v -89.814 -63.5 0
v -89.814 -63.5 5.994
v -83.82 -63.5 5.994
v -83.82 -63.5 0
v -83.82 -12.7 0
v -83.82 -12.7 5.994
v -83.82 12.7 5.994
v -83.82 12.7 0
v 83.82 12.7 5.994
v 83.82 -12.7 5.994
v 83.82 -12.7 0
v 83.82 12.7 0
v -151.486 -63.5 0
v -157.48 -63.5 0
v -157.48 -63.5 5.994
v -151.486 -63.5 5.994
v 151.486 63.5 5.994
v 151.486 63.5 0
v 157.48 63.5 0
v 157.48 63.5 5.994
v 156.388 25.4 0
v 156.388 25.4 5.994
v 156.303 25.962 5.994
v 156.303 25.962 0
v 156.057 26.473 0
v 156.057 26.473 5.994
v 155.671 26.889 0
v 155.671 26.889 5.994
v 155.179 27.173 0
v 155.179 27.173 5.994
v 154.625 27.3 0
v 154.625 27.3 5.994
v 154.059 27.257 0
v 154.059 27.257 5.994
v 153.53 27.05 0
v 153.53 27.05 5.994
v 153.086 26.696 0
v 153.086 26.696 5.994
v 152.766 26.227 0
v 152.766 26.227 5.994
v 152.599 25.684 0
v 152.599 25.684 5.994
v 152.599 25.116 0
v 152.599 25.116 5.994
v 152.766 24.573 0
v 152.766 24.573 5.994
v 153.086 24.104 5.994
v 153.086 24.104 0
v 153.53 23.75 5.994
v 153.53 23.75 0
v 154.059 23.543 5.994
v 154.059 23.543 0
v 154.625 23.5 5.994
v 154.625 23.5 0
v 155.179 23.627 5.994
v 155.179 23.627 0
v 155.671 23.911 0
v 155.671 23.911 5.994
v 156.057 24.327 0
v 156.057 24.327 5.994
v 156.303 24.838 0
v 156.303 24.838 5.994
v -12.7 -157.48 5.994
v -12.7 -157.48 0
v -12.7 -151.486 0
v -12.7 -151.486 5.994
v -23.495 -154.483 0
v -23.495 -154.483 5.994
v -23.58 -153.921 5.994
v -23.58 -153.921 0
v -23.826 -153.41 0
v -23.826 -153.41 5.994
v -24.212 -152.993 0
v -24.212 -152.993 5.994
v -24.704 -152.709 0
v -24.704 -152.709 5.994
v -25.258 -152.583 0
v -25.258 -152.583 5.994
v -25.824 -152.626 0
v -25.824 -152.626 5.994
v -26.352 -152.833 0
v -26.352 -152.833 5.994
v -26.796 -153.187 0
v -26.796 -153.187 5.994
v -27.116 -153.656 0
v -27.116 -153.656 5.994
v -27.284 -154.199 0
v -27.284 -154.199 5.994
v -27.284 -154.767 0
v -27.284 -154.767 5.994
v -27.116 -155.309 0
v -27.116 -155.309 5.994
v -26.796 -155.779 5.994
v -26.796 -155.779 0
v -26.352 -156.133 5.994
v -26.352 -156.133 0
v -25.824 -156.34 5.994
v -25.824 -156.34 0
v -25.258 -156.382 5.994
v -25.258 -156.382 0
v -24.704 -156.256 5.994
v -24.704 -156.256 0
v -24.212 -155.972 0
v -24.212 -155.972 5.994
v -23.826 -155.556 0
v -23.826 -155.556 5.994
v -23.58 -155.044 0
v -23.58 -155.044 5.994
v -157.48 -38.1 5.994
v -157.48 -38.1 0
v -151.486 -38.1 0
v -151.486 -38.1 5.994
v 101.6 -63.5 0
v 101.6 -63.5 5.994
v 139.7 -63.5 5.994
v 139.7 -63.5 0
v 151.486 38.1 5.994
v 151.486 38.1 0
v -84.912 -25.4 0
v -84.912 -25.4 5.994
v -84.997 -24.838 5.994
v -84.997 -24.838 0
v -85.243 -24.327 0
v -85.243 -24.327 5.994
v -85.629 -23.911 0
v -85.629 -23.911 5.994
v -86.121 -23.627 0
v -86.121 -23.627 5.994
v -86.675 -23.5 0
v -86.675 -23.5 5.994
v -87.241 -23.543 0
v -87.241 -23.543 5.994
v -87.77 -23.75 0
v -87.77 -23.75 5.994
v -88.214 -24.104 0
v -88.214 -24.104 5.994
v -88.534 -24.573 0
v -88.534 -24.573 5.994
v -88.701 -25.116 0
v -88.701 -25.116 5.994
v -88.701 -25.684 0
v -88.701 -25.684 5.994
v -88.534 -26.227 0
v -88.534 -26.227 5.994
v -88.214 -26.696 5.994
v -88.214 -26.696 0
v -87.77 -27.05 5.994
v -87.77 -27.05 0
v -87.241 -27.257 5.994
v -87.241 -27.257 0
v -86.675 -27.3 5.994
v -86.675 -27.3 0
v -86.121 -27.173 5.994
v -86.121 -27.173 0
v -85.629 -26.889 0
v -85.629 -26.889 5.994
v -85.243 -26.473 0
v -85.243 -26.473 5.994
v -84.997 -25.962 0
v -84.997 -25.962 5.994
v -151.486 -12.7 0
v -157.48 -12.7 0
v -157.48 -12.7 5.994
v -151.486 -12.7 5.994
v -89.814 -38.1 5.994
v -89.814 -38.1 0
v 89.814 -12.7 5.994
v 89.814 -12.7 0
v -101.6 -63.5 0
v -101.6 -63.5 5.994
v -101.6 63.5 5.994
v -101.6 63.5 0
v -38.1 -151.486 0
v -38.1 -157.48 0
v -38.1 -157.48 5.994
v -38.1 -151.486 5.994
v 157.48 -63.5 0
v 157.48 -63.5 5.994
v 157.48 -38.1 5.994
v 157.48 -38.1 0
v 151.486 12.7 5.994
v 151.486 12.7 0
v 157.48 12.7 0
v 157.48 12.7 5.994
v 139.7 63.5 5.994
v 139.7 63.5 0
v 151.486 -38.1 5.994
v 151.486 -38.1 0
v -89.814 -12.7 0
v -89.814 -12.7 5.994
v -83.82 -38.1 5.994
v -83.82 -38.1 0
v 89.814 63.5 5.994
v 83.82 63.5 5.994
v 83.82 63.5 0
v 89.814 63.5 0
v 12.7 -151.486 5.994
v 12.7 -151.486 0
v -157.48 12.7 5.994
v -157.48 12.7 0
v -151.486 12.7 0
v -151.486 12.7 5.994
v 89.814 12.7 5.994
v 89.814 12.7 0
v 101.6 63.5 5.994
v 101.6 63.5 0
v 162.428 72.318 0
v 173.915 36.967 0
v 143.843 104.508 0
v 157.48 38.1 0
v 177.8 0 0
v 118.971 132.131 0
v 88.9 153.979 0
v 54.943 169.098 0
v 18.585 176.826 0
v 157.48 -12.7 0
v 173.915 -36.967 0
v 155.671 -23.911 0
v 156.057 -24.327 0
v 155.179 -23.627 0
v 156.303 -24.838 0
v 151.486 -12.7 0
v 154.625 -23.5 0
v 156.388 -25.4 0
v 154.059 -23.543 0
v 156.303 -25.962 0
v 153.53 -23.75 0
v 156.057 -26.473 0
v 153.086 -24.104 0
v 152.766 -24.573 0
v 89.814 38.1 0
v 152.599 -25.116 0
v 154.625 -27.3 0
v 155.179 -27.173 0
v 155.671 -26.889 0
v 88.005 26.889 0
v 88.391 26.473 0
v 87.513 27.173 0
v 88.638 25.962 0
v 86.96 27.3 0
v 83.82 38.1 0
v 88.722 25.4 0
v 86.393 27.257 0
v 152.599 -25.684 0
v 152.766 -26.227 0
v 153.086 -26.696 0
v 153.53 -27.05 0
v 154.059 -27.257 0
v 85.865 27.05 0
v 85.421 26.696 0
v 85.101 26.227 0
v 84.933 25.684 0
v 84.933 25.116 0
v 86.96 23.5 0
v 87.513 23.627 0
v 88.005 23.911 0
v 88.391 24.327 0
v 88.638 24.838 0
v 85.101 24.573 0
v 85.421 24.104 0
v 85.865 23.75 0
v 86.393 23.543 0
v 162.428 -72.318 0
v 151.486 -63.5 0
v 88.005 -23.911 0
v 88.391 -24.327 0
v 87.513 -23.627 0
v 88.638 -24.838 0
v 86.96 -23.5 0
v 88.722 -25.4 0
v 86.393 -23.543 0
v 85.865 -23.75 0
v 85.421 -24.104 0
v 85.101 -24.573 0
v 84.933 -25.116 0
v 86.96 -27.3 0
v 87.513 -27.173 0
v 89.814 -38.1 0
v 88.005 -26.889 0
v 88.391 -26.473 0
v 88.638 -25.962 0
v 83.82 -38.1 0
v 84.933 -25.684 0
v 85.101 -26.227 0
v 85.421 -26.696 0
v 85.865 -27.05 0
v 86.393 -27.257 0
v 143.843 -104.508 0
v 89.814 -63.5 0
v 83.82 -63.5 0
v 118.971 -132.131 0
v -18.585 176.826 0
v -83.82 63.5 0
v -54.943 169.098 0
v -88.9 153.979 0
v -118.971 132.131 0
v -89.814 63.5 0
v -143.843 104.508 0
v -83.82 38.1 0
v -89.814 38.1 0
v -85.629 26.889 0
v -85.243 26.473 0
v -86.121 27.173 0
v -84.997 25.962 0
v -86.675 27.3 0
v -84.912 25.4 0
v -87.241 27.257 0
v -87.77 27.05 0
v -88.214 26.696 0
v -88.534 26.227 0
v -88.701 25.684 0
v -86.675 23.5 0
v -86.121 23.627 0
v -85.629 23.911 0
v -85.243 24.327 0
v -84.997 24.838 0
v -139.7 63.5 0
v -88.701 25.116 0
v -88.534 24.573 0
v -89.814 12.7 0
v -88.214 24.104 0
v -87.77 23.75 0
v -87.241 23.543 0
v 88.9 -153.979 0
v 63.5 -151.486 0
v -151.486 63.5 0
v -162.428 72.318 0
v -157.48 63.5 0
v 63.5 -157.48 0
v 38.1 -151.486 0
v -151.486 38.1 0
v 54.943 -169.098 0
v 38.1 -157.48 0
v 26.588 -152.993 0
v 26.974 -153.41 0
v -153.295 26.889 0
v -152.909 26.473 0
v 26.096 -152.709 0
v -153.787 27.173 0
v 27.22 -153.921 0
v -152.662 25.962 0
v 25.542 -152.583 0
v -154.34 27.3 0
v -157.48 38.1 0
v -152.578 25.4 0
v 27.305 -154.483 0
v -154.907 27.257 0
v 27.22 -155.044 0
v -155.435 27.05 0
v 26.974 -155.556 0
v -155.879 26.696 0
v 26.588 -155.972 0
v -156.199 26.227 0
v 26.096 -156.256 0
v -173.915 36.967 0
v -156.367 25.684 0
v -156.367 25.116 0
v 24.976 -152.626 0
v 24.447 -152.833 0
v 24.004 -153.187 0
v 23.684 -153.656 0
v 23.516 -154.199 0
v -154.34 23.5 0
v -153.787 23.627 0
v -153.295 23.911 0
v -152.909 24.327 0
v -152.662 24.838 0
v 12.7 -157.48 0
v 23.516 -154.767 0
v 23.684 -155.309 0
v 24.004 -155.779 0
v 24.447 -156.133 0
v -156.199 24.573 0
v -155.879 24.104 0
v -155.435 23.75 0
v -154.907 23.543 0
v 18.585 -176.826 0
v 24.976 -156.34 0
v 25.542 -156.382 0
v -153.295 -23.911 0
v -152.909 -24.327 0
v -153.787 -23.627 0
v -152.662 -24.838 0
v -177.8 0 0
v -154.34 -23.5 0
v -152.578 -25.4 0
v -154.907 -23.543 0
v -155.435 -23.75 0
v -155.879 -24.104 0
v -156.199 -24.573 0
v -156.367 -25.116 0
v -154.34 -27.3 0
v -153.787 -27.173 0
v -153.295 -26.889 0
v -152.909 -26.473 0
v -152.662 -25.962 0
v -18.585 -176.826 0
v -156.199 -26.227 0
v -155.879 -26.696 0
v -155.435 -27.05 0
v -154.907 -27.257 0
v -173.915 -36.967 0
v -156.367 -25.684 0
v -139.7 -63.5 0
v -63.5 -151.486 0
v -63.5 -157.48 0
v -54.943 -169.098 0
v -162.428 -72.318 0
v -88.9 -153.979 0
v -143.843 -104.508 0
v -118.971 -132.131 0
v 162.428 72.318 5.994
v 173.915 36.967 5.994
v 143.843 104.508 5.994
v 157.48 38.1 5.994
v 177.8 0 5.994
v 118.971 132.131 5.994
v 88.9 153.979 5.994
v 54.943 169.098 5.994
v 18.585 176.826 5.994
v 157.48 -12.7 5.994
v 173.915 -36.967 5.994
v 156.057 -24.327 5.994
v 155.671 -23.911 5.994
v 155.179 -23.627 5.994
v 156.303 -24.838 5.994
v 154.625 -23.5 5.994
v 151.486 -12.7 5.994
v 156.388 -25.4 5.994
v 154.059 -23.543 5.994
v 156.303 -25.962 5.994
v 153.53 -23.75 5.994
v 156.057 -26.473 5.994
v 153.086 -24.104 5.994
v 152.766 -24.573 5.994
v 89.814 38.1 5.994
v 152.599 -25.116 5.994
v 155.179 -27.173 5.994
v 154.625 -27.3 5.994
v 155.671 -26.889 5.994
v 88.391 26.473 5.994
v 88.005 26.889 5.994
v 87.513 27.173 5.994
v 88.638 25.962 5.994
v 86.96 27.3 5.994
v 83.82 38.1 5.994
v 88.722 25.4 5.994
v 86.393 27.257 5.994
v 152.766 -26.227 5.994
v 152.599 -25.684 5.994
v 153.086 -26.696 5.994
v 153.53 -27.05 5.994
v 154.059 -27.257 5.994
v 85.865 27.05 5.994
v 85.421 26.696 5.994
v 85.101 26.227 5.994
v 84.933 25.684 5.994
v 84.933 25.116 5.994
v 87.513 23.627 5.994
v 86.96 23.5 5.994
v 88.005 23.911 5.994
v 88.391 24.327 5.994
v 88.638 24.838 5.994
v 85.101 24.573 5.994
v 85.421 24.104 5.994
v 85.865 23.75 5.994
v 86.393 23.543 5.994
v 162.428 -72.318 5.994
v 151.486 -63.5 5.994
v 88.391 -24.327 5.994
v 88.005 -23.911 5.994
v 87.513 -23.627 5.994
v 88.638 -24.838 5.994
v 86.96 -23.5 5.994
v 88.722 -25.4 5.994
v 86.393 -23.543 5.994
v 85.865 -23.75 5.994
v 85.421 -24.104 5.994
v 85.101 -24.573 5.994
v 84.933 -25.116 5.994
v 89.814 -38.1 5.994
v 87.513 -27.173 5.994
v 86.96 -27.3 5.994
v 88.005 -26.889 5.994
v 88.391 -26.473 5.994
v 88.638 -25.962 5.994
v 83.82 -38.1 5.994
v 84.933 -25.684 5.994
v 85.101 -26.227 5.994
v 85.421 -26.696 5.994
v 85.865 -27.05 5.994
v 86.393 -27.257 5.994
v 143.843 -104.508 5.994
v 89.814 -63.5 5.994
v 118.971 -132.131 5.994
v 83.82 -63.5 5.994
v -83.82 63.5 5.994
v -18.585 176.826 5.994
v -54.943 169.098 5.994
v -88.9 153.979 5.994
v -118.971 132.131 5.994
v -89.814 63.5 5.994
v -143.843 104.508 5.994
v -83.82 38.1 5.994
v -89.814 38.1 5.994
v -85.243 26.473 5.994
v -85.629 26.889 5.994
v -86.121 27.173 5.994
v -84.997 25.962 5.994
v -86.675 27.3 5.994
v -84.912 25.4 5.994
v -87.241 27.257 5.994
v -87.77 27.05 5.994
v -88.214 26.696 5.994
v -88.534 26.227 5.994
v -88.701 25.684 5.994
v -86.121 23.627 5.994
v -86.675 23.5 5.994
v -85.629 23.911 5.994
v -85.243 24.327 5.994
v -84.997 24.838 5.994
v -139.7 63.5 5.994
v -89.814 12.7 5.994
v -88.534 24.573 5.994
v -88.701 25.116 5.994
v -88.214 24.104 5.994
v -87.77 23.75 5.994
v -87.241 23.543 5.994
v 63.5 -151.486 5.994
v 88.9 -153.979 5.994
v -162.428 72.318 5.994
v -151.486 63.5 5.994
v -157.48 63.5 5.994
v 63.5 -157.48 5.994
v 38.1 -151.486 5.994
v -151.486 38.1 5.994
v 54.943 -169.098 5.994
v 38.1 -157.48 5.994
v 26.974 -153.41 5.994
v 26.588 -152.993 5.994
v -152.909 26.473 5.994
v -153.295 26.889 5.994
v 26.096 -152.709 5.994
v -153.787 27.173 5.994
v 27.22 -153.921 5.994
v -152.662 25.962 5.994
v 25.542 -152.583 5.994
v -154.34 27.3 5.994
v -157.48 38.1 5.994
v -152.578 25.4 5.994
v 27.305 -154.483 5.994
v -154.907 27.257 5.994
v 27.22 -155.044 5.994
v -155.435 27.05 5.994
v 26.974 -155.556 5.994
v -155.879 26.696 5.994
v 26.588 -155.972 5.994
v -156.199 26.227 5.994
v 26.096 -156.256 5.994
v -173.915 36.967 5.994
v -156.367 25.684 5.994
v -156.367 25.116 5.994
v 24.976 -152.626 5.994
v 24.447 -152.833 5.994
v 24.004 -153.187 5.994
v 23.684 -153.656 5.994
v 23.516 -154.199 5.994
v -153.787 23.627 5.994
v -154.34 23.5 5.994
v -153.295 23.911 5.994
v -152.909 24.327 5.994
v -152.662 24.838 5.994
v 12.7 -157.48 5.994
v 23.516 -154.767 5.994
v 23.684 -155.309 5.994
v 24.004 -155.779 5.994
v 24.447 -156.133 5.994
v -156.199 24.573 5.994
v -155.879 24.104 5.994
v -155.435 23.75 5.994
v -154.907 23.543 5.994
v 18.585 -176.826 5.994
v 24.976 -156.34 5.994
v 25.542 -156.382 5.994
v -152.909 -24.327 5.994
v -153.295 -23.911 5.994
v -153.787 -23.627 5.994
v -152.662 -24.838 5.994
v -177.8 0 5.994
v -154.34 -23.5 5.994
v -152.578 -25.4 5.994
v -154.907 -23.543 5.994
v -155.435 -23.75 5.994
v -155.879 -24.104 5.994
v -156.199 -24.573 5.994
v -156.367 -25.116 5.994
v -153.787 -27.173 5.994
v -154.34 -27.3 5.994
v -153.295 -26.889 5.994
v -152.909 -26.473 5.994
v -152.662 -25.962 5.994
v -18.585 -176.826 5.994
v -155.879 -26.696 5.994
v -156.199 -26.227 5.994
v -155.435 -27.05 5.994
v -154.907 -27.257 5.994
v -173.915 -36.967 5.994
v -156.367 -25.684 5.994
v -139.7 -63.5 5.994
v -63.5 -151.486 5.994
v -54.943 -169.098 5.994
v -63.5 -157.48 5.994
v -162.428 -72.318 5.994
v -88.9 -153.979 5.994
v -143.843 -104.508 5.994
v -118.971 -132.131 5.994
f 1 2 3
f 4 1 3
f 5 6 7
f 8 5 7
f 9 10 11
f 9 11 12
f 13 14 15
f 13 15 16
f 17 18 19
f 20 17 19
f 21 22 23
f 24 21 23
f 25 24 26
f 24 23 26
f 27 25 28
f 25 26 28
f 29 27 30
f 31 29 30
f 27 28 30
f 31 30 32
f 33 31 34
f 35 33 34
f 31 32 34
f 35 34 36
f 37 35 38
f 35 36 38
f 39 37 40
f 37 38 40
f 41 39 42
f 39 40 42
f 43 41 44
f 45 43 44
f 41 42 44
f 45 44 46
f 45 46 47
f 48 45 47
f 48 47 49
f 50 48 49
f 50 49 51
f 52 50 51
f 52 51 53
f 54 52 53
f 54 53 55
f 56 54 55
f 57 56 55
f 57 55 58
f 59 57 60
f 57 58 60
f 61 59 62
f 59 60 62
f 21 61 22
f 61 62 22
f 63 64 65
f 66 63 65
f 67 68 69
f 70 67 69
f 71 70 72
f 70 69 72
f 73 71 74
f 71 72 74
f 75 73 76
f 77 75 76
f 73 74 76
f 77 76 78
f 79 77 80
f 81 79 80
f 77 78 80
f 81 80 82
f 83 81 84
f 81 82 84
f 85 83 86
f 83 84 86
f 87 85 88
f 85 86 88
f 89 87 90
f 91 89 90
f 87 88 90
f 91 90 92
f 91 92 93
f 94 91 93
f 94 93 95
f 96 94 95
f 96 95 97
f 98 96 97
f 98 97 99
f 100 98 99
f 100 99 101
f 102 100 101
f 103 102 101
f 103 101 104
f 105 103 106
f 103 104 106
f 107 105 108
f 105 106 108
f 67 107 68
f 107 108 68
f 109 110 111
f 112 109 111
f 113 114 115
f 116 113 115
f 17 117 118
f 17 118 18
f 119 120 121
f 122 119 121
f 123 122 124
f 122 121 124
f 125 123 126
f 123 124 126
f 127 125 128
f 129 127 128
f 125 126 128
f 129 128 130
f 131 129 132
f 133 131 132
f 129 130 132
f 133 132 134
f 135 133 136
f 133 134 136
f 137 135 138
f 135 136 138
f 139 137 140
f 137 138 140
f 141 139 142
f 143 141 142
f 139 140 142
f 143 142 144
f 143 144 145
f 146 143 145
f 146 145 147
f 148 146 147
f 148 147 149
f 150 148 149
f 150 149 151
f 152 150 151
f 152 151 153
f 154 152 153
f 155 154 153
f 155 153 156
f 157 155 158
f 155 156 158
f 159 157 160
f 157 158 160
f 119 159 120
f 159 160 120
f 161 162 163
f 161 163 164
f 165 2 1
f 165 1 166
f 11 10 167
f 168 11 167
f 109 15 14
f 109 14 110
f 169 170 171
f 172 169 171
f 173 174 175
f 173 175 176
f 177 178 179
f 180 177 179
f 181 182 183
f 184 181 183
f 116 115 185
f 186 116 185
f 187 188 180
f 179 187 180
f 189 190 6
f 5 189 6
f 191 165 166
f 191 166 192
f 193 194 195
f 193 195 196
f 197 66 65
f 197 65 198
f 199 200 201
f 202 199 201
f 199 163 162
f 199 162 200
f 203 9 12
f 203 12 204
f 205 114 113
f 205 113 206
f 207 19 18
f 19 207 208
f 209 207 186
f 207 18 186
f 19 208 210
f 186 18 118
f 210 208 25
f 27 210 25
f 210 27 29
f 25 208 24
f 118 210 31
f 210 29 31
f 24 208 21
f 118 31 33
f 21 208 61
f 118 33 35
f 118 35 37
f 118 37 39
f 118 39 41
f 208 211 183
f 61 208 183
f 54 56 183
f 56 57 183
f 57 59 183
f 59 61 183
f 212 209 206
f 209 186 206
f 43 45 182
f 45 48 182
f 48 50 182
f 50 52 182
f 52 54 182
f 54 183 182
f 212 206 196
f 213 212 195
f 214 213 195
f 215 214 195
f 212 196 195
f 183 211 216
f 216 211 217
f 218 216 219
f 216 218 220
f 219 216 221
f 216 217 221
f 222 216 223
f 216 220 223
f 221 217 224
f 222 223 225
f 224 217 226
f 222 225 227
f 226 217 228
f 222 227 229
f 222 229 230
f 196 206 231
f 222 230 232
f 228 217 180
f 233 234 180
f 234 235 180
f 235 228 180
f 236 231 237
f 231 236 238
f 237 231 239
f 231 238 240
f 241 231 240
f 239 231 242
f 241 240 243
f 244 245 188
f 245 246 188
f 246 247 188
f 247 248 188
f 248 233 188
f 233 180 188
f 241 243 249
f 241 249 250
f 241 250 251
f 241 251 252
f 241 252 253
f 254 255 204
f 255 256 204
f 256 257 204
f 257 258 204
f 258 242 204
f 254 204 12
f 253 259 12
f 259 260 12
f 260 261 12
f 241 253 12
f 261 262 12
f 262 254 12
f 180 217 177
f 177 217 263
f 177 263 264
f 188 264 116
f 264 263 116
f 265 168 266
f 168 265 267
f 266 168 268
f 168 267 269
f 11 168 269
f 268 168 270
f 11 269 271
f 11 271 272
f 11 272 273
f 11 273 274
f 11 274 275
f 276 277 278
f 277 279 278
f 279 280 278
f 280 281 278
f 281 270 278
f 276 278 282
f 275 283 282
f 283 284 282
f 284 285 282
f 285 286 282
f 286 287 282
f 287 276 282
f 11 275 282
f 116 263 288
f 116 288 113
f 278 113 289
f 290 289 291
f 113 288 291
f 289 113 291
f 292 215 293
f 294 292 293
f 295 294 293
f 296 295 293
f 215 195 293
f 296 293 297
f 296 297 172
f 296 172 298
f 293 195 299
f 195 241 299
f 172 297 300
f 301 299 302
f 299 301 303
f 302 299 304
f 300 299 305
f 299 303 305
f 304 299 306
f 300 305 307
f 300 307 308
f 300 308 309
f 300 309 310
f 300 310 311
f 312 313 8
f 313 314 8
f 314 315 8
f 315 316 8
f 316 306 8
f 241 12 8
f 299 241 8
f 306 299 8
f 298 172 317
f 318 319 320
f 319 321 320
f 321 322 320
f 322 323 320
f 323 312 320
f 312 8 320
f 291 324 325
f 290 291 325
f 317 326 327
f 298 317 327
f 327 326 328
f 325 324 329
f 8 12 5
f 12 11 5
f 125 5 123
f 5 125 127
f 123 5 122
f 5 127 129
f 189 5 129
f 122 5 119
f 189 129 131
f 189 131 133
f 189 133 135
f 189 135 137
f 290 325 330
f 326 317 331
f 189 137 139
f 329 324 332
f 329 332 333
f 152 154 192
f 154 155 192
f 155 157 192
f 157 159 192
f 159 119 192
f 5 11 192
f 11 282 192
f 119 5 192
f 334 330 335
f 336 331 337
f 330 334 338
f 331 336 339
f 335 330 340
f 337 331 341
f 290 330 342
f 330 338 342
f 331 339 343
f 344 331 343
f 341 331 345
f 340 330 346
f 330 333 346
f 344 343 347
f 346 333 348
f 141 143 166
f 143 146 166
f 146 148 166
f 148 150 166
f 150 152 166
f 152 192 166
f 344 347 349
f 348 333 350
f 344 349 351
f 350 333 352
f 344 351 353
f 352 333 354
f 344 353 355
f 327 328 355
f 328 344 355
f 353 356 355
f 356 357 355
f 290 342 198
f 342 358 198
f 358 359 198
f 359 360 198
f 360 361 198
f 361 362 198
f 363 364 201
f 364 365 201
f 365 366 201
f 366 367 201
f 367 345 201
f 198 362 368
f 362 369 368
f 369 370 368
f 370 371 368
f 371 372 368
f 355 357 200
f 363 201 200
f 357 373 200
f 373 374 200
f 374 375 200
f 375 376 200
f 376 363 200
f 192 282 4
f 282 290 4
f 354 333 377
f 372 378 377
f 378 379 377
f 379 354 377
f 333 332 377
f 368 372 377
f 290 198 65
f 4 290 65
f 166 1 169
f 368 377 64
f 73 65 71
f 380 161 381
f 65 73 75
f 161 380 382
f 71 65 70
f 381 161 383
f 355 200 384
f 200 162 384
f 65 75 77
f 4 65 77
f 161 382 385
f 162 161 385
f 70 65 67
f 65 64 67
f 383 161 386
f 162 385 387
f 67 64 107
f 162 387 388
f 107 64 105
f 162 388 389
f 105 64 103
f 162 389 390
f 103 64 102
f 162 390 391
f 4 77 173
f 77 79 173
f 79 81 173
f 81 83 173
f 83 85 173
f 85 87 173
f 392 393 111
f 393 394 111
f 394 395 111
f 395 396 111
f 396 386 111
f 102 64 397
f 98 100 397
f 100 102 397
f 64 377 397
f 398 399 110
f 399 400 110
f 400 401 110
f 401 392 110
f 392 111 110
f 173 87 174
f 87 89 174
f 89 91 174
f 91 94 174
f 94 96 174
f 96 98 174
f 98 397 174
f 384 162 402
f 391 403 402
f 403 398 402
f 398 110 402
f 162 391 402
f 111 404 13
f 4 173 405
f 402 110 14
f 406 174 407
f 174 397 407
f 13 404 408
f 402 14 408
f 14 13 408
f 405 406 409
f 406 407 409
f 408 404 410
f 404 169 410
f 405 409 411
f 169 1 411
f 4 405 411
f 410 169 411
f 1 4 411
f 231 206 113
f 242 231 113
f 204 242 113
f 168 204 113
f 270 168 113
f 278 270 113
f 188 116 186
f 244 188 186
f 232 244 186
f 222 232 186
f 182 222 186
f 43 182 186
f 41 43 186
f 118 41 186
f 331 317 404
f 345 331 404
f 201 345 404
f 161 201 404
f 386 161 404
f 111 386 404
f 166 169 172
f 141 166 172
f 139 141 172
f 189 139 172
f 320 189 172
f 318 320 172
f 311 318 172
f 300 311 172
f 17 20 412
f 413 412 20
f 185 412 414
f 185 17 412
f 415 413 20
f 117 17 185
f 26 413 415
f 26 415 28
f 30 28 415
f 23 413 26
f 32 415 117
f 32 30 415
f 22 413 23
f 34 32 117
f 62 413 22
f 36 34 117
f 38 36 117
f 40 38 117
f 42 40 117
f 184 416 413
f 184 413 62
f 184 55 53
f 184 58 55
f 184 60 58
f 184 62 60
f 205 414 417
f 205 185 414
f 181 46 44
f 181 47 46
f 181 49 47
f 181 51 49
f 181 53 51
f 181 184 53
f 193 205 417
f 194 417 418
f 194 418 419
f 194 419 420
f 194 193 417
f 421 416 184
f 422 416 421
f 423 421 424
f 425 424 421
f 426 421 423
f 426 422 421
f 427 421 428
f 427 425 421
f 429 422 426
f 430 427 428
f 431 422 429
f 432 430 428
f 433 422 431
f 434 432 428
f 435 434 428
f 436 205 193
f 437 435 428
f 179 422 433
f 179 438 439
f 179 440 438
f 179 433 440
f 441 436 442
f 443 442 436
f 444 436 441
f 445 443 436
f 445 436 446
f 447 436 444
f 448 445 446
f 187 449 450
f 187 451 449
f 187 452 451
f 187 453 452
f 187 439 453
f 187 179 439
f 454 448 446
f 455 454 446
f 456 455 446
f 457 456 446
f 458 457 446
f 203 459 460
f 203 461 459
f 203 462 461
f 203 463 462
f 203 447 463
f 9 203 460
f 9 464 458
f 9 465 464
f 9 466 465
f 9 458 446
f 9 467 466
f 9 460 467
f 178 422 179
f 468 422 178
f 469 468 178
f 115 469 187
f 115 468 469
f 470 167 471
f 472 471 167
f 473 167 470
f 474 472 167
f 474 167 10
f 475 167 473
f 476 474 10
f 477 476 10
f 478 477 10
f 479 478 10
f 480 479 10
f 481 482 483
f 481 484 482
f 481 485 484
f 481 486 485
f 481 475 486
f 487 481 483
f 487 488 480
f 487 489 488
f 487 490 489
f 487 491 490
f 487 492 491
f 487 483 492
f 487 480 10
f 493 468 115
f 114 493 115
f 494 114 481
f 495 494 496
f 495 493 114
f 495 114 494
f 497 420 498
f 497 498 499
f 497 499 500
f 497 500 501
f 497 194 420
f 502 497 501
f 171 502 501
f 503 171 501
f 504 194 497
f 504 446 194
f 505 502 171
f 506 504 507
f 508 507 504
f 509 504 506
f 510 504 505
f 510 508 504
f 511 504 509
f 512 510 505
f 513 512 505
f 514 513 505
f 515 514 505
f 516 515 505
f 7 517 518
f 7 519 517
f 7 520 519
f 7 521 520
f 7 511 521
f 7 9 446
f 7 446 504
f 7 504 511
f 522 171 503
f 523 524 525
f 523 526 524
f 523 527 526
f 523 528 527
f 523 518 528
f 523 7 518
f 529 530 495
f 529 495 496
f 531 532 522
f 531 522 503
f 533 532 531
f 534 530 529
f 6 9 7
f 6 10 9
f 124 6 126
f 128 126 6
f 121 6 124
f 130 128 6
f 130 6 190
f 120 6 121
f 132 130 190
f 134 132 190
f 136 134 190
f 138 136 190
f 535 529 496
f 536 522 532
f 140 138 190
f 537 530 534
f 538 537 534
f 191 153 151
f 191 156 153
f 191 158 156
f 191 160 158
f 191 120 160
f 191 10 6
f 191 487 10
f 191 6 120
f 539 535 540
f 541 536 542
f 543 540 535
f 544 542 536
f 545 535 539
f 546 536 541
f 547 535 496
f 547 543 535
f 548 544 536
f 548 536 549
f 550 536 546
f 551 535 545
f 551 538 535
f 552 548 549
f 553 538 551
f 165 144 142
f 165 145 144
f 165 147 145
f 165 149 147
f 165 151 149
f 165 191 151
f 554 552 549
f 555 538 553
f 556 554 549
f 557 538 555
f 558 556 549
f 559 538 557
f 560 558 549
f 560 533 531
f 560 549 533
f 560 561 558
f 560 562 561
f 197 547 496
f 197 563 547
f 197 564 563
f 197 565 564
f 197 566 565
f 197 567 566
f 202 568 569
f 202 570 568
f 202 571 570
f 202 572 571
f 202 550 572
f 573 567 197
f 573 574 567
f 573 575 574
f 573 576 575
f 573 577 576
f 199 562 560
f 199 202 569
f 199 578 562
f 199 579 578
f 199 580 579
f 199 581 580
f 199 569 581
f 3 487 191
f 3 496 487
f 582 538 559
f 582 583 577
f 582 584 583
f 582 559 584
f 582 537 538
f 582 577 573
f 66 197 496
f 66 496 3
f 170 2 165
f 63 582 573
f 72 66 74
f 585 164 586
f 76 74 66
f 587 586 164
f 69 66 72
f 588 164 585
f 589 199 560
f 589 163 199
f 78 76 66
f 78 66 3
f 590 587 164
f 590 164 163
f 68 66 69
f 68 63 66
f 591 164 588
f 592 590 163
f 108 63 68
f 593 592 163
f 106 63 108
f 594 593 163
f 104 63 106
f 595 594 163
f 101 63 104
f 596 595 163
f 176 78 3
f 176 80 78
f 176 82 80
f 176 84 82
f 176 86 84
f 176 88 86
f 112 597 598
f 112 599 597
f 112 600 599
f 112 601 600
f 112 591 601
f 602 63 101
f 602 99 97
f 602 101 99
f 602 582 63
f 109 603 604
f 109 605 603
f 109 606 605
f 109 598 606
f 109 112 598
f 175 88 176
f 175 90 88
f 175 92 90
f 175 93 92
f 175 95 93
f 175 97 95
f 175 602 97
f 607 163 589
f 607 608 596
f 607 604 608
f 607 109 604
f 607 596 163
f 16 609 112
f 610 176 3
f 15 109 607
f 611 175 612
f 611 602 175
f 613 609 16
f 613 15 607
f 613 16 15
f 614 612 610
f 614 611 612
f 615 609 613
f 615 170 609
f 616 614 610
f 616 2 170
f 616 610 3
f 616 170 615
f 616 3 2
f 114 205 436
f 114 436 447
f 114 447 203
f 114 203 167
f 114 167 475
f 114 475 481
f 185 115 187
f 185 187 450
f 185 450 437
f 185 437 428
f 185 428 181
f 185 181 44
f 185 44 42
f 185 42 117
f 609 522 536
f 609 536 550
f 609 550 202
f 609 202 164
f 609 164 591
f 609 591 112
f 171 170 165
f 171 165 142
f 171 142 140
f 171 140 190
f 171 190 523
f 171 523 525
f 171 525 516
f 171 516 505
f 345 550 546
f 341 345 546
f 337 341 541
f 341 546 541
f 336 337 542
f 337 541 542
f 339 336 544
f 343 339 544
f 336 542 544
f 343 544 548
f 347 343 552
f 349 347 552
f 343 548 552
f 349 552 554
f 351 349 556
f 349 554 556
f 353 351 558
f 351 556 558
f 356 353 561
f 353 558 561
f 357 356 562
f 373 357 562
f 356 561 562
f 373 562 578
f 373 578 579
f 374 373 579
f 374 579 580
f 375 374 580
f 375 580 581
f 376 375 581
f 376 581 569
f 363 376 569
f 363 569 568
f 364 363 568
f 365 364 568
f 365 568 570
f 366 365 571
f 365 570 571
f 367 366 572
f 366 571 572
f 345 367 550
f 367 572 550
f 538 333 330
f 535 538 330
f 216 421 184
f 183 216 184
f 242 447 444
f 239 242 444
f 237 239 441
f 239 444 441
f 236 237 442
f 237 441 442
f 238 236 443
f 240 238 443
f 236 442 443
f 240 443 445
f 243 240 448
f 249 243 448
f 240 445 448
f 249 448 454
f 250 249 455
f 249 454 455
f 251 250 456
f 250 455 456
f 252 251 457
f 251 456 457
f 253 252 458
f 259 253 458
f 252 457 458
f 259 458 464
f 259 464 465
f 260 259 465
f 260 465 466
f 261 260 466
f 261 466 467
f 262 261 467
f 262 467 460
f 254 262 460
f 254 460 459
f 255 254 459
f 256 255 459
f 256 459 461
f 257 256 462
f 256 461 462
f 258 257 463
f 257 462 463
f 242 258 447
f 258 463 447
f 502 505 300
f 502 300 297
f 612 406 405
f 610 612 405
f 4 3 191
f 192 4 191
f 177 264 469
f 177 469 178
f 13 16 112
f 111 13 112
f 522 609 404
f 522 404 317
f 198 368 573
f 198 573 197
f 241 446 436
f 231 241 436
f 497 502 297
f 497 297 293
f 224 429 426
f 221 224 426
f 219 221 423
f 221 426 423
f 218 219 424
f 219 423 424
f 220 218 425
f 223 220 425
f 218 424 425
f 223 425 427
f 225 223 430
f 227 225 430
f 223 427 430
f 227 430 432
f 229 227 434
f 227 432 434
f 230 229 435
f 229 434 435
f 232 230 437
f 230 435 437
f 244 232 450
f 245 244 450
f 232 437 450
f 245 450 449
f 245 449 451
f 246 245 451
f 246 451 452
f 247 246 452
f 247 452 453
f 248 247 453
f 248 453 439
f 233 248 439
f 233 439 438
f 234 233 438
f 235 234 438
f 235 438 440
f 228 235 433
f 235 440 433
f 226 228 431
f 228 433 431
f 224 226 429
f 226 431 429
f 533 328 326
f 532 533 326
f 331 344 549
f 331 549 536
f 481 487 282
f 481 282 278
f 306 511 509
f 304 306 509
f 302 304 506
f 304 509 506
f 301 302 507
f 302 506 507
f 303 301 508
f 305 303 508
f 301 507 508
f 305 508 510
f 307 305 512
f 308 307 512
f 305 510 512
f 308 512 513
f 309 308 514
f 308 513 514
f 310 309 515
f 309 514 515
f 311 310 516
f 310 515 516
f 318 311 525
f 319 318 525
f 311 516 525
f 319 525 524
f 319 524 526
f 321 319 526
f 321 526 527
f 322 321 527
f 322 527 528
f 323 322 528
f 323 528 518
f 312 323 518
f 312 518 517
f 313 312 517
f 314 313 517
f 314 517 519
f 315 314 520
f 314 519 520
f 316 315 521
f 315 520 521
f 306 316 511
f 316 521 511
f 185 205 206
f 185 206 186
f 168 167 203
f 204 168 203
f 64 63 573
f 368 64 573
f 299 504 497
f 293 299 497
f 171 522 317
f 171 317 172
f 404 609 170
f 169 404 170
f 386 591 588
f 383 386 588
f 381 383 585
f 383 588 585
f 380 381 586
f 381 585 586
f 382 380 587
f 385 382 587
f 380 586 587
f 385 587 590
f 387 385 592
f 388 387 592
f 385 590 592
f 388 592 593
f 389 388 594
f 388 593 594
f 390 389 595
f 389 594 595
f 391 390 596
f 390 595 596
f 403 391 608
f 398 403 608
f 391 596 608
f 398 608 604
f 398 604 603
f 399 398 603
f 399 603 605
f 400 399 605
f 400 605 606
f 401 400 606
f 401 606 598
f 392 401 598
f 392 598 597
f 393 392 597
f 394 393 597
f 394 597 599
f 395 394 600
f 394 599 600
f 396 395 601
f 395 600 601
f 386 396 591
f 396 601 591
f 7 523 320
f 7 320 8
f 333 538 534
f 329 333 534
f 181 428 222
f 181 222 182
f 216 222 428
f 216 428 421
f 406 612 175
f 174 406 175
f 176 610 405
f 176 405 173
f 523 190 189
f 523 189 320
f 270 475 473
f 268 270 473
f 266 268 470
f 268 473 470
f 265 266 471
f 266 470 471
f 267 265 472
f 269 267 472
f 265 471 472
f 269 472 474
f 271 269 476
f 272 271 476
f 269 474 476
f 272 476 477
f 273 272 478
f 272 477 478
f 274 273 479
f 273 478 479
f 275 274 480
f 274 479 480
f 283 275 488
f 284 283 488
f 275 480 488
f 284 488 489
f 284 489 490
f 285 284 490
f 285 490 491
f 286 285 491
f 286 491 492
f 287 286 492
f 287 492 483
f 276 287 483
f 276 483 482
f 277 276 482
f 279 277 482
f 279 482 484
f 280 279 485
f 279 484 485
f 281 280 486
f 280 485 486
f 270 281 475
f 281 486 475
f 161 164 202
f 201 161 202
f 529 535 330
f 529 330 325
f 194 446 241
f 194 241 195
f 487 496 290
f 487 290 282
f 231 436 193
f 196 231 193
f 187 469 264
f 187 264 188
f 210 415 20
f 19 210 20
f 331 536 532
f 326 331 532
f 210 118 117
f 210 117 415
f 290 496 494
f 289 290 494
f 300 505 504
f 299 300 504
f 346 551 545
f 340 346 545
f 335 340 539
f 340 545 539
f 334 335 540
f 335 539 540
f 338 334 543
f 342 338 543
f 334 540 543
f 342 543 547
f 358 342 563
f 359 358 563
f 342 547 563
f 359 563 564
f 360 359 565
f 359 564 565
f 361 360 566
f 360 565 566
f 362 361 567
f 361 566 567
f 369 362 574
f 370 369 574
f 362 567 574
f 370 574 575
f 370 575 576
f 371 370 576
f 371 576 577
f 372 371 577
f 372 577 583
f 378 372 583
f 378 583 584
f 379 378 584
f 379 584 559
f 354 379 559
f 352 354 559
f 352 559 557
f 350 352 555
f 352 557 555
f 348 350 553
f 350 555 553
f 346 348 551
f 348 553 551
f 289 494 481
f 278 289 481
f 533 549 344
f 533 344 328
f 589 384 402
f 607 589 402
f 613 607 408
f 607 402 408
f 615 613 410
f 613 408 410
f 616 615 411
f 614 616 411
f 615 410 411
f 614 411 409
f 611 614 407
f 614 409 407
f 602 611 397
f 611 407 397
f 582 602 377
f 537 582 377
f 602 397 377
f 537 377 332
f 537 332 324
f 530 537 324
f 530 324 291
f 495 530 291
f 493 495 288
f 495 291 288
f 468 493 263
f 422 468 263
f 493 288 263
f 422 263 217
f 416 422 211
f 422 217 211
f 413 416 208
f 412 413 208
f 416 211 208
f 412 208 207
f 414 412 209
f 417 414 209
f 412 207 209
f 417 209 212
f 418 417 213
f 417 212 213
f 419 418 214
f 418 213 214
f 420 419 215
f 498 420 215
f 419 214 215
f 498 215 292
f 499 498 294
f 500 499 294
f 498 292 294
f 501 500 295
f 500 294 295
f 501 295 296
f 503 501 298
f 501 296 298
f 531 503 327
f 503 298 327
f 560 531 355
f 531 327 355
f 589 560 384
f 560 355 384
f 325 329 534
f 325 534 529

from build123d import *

# Parameters (mm, degrees)
SKETCH1_R           = 177.8
BOSS_EXTRUDE1_DEPTH = 5.9944
SKETCH3_R           = 1.905
SKETCH3_W           = 5.9944
SKETCH3_H           = 25.4
SKETCH3_W_2         = 38.1
SKETCH3_H_2         = 127
SKETCH3_W_3         = 25.4
SKETCH3_H_3         = 5.9944
CUT_EXTRUDE1_DEPTH  = 5.9944


with BuildPart() as part:
    # Sketch1 → Boss-Extrude1 (new body)
    with BuildSketch(Plane.XY):
        with Locations(Location((0, 0, 0), (0, 0, 180))):
            Circle(SKETCH1_R)
    extrude(amount=BOSS_EXTRUDE1_DEPTH)

    # Sketch3 → Cut-Extrude1 (cut)
    with BuildSketch(Plane.XY.offset(5.9944)):
        with Locations((-154.4828, 25.4)):
            Circle(SKETCH3_R)
        with Locations((-154.4828, -25.4)):
            Circle(SKETCH3_R)
        with Locations((-86.8172, -25.4)):
            Circle(SKETCH3_R)
        with Locations((-86.8172, 25.4)):
            Circle(SKETCH3_R)
        with Locations((86.8172, -25.4)):
            Circle(SKETCH3_R)
        with Locations((154.4828, -25.4)):
            Circle(SKETCH3_R)
        with Locations((86.8172, 25.4)):
            Circle(SKETCH3_R)
        with Locations((154.4828, 25.4)):
            Circle(SKETCH3_R)
        with Locations((-25.4, -154.4828)):
            Circle(SKETCH3_R)
        with Locations((25.4, -154.4828)):
            Circle(SKETCH3_R)
        with Locations((-154.4828, -50.8)):
            Rectangle(SKETCH3_W, SKETCH3_H)
        with Locations((-120.65, 0)):
            Rectangle(SKETCH3_W_2, SKETCH3_H_2)
        with Locations((-154.4828, 50.8)):
            Rectangle(SKETCH3_W, SKETCH3_H)
        with Locations((-154.4828, 0)):
            Rectangle(SKETCH3_W, SKETCH3_H)
        with Locations((154.4828, 0)):
            Rectangle(SKETCH3_W, SKETCH3_H)
        with Locations((154.4828, -50.8)):
            Rectangle(SKETCH3_W, SKETCH3_H)
        with Locations((154.4828, 50.8)):
            Rectangle(SKETCH3_W, SKETCH3_H)
        with Locations((120.65, 0)):
            Rectangle(SKETCH3_W_2, SKETCH3_H_2)
        with Locations((-86.8172, 0)):
            Rectangle(SKETCH3_W, SKETCH3_H)
        with Locations((-86.8172, -50.8)):
            Rectangle(SKETCH3_W, SKETCH3_H)
        with Locations((-86.8172, 50.8)):
            Rectangle(SKETCH3_W, SKETCH3_H)
        with Locations((86.8172, -50.8)):
            Rectangle(SKETCH3_W, SKETCH3_H)
        with Locations((86.8172, 50.8)):
            Rectangle(SKETCH3_W, SKETCH3_H)
        with Locations((86.8172, 0)):
            Rectangle(SKETCH3_W, SKETCH3_H)
        with Locations((50.8, -154.4828)):
            Rectangle(SKETCH3_W_3, SKETCH3_H_3)
        with Locations((-50.8, -154.4828)):
            Rectangle(SKETCH3_W_3, SKETCH3_H_3)
        with Locations((0, -154.4828)):
            Rectangle(SKETCH3_W_3, SKETCH3_H_3)
    extrude(amount=-CUT_EXTRUDE1_DEPTH, mode=Mode.SUBTRACT)


solid = part.part
